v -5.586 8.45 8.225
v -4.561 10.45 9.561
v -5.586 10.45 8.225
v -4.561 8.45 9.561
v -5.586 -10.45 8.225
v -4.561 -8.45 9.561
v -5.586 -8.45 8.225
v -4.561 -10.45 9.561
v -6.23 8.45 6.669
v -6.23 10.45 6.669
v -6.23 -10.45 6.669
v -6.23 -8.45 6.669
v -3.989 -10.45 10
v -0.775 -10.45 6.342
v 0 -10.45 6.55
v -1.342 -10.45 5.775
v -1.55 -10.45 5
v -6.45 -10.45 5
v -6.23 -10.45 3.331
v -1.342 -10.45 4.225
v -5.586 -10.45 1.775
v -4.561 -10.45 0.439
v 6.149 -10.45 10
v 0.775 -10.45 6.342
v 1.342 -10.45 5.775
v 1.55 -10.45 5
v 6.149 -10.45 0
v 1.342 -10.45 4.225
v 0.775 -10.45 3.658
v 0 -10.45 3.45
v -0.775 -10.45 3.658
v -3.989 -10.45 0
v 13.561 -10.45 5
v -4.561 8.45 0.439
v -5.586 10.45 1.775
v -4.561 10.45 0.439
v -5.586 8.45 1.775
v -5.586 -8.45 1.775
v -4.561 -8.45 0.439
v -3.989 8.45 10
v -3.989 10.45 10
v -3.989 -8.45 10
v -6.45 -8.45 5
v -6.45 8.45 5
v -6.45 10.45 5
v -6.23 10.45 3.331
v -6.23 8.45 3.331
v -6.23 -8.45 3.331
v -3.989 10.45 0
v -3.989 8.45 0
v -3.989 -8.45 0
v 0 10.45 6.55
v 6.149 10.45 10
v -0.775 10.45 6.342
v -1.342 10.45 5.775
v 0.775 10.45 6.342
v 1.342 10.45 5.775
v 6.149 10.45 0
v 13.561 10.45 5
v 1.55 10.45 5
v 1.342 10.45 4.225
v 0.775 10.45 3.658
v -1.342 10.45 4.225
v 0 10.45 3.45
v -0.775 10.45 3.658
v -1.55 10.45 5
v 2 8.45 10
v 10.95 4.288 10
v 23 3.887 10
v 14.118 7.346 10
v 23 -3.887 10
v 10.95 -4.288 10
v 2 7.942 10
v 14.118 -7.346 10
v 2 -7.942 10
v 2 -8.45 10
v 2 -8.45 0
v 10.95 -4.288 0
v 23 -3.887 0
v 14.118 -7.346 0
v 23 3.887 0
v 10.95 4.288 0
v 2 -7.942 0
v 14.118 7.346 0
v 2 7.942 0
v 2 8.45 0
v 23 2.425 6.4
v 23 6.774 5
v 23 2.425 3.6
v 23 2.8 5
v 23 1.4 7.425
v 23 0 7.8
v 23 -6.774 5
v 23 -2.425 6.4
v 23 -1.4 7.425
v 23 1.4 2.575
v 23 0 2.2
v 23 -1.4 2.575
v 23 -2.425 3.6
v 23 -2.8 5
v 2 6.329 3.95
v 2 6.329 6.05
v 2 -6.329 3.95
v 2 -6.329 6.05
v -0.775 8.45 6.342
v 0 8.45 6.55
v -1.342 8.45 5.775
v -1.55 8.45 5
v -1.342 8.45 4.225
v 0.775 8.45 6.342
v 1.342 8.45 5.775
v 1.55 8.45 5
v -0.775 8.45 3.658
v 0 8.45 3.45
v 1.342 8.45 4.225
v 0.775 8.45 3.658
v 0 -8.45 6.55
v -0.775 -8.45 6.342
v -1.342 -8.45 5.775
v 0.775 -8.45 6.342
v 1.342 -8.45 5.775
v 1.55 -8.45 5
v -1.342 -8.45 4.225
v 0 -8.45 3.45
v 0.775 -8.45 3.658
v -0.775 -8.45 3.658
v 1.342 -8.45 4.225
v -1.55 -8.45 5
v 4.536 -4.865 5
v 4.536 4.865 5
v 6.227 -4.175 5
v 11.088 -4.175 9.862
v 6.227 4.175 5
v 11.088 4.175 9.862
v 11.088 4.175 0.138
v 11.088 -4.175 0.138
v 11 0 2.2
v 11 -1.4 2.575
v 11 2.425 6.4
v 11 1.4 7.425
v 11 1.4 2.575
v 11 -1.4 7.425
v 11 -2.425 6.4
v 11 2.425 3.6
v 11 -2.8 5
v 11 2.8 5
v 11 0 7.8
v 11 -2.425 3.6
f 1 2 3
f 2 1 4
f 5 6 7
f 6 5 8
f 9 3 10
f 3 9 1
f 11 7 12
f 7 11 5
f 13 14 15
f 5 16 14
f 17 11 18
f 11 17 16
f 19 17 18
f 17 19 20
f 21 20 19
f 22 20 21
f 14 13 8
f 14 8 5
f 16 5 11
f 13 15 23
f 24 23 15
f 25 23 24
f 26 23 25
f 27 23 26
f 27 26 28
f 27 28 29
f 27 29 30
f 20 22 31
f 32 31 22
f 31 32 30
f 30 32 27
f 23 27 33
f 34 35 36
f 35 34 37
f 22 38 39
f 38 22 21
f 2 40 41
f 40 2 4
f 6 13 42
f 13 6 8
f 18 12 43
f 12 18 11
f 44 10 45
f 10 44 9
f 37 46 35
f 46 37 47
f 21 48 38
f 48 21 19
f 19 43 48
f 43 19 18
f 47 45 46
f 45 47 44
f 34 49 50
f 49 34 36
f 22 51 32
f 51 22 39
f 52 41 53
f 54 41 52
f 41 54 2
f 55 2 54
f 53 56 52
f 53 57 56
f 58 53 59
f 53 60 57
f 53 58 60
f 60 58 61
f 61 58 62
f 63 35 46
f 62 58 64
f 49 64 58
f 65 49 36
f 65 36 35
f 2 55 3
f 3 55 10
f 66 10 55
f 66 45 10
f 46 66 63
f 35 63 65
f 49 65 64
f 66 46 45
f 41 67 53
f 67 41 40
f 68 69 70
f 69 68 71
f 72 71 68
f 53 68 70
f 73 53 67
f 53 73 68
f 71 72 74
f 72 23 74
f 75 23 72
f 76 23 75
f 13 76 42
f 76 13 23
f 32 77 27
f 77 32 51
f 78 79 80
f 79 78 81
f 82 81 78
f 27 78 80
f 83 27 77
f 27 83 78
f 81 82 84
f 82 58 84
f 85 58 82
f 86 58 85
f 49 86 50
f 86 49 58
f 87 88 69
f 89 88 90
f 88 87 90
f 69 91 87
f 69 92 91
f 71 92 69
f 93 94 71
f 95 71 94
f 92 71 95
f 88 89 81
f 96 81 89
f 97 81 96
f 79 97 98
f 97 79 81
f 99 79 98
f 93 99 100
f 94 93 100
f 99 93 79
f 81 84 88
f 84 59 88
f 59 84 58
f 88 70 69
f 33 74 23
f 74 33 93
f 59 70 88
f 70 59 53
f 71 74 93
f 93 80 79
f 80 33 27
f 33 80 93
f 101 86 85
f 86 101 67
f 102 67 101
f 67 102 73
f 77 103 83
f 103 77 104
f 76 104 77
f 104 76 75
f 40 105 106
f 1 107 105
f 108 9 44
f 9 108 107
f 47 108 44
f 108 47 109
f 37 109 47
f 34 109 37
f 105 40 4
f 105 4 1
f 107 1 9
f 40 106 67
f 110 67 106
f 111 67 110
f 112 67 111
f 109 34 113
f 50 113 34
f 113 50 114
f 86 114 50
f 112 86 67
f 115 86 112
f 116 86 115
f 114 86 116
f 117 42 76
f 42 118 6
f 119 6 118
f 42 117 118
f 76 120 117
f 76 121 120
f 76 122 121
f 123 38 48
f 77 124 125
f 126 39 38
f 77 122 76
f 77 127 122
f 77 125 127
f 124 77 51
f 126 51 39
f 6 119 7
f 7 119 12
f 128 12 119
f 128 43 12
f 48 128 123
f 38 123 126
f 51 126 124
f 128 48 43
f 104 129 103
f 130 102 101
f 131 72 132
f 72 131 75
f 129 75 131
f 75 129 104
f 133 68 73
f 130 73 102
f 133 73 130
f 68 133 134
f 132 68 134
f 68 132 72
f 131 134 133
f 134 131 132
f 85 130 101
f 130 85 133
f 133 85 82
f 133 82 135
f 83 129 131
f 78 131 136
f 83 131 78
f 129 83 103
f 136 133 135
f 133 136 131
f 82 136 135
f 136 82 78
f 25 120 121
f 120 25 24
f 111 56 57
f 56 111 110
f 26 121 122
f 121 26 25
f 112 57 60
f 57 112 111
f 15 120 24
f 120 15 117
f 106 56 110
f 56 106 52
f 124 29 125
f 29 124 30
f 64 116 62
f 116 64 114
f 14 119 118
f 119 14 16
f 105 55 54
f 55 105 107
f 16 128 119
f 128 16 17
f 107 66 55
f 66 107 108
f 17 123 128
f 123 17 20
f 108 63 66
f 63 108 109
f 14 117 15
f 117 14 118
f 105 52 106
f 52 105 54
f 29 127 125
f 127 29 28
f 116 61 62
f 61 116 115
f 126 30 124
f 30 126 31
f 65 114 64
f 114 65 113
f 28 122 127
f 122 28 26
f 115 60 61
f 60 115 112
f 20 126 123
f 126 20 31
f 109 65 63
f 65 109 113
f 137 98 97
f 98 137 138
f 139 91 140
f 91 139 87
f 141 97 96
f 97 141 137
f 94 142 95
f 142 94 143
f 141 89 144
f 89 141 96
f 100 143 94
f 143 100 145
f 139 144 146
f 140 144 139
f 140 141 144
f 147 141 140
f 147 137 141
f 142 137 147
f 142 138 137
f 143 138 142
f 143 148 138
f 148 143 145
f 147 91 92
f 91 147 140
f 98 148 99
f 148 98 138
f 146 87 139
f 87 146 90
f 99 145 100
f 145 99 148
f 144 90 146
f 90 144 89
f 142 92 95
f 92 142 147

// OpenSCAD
h = 10;
r = h/2 / cos(30) + 1;
co = 16.9;		// attachment thickness
mt = 4;		// mount thickness

module jaws() {
  difference() {
    union() {
      intersection () {
        rotate([90, 0, 0]) cylinder(r = co / 2 - mt / 2, h = co + mt, center=true, $fn=24);
        translate([-4, 0, 0]) cube([20, 24, h], center=true);
      }
      intersection() {
        translate([10, 0, 0]) cube([26, co + mt, h], center=true);
        translate([10, 0, 0]) rotate([0, 90, 0]) rotate([0, 0, 30])
          cylinder(r1=co, r2=r, h=26, center=true, $fn=6);
      }
    } 
    translate([-4.5, 0, 0]) cube([h + 3, co, h + 3], center=true);
    translate([-1.5, 0, 0]) rotate([0, 0, 30])
      cylinder(r=co / 2 - 0.1, h=10, center=true, $fn=6);
    translate([0, 0, 4]) rotate([0, 45, 0])
      rotate([0, 0, 30]) cylinder(r=co / 2 - 0.1, h = co, center=true, $fn=6);
    translate([0, 0, -4]) rotate([0, -45, 0])
      rotate([0, 0, 30]) cylinder(r=co / 2 - 0.1, h = co, center=true, $fn=6);
    rotate([90, 0, 0]) cylinder(r=1.55, h=40, center=true, $fn=12);
    translate([21, 0, 0]) rotate([0, 90, 0])
      cylinder(r=2.8, h=20, center=true, $fn=12); 
  }
}

translate([0, 0, h/2]) jaws();
